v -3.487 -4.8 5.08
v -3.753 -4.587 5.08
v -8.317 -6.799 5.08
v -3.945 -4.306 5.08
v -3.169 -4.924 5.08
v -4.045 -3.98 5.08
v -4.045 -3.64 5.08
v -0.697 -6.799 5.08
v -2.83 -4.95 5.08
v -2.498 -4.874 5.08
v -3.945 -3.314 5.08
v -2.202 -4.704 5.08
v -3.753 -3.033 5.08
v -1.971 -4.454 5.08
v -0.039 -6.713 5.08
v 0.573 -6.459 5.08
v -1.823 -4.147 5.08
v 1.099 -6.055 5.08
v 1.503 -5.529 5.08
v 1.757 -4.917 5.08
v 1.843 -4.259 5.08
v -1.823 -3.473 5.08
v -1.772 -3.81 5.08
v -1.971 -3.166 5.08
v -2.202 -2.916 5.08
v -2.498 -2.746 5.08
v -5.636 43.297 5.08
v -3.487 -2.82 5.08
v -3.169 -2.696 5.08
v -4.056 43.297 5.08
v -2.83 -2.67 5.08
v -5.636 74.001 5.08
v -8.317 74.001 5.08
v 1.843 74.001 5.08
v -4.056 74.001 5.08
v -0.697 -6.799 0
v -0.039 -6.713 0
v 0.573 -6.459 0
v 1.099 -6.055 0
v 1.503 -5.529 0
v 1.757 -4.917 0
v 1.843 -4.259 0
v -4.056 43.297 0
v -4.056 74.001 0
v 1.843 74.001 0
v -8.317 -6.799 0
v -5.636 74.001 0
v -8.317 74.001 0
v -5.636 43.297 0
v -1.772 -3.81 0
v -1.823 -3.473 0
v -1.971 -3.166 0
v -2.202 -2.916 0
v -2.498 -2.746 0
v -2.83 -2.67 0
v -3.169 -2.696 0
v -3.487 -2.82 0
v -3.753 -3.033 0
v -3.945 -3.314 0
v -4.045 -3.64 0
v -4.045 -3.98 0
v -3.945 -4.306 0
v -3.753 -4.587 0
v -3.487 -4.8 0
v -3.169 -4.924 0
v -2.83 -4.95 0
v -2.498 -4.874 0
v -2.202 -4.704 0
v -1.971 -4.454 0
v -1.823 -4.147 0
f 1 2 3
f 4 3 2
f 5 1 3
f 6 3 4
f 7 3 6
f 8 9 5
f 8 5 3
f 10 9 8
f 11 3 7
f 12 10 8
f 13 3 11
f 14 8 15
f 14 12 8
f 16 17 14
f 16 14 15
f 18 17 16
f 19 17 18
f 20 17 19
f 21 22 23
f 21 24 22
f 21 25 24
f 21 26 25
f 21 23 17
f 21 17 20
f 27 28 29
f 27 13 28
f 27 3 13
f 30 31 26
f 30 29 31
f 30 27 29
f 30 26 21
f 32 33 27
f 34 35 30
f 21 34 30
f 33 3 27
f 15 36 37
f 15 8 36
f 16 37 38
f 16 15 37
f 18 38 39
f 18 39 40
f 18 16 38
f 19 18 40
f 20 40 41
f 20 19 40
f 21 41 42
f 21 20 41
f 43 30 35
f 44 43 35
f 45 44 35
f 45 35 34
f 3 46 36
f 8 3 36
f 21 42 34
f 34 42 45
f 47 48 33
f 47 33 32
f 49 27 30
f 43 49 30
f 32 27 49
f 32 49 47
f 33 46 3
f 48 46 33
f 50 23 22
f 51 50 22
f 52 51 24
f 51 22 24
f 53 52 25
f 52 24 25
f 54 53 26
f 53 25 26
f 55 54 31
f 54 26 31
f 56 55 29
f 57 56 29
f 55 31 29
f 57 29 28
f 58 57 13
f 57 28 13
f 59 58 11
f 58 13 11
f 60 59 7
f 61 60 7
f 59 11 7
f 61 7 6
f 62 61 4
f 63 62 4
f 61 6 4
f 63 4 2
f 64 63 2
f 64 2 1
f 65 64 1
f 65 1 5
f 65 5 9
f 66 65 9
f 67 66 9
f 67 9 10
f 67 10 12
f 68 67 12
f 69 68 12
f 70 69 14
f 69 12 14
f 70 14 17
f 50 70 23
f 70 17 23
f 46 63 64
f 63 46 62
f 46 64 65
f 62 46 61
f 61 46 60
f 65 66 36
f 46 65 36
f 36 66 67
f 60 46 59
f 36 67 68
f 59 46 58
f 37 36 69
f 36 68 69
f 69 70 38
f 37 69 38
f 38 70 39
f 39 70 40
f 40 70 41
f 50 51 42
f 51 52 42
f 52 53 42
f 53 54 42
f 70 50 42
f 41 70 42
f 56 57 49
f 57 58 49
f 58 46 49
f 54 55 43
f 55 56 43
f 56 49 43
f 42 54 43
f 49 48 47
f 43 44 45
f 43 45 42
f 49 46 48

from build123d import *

# Parameters (mm, degrees)
SKETCH1_W           = 10.16
SKETCH1_H           = 80.800676527
BOSS_EXTRUDE1_DEPTH = 5.08
FILLET1_R           = 2.54
SKETCH2_R           = 1.143
SKETCH2_W           = 1.579389271
SKETCH2_H           = 30.704752465
CUT_EXTRUDE1_DEPTH  = 5.08


with BuildPart() as part:
    # Sketch1 → Boss-Extrude1 (new body)
    with BuildSketch(Plane.XY):
        with Locations((-3.236775432, 33.601000469)):
            Rectangle(SKETCH1_W, SKETCH1_H)
    extrude(amount=BOSS_EXTRUDE1_DEPTH)

    # Fillet1
    fillet1_edges = [part.edges().sort_by_distance(p)[0] for p in [
        (1.843224568, -6.799337795, 2.54),
    ]]
    fillet(fillet1_edges, radius=FILLET1_R)

    # Sketch2 → Cut-Extrude1 (cut)
    with BuildSketch(Plane.XY.offset(5.08)):
        with Locations((-2.915125323, -3.81)):
            Circle(SKETCH2_R)
        with Locations((-4.845930623, 58.6489625)):
            Rectangle(SKETCH2_W, SKETCH2_H)
    extrude(amount=-CUT_EXTRUDE1_DEPTH, mode=Mode.SUBTRACT)


solid = part.part
